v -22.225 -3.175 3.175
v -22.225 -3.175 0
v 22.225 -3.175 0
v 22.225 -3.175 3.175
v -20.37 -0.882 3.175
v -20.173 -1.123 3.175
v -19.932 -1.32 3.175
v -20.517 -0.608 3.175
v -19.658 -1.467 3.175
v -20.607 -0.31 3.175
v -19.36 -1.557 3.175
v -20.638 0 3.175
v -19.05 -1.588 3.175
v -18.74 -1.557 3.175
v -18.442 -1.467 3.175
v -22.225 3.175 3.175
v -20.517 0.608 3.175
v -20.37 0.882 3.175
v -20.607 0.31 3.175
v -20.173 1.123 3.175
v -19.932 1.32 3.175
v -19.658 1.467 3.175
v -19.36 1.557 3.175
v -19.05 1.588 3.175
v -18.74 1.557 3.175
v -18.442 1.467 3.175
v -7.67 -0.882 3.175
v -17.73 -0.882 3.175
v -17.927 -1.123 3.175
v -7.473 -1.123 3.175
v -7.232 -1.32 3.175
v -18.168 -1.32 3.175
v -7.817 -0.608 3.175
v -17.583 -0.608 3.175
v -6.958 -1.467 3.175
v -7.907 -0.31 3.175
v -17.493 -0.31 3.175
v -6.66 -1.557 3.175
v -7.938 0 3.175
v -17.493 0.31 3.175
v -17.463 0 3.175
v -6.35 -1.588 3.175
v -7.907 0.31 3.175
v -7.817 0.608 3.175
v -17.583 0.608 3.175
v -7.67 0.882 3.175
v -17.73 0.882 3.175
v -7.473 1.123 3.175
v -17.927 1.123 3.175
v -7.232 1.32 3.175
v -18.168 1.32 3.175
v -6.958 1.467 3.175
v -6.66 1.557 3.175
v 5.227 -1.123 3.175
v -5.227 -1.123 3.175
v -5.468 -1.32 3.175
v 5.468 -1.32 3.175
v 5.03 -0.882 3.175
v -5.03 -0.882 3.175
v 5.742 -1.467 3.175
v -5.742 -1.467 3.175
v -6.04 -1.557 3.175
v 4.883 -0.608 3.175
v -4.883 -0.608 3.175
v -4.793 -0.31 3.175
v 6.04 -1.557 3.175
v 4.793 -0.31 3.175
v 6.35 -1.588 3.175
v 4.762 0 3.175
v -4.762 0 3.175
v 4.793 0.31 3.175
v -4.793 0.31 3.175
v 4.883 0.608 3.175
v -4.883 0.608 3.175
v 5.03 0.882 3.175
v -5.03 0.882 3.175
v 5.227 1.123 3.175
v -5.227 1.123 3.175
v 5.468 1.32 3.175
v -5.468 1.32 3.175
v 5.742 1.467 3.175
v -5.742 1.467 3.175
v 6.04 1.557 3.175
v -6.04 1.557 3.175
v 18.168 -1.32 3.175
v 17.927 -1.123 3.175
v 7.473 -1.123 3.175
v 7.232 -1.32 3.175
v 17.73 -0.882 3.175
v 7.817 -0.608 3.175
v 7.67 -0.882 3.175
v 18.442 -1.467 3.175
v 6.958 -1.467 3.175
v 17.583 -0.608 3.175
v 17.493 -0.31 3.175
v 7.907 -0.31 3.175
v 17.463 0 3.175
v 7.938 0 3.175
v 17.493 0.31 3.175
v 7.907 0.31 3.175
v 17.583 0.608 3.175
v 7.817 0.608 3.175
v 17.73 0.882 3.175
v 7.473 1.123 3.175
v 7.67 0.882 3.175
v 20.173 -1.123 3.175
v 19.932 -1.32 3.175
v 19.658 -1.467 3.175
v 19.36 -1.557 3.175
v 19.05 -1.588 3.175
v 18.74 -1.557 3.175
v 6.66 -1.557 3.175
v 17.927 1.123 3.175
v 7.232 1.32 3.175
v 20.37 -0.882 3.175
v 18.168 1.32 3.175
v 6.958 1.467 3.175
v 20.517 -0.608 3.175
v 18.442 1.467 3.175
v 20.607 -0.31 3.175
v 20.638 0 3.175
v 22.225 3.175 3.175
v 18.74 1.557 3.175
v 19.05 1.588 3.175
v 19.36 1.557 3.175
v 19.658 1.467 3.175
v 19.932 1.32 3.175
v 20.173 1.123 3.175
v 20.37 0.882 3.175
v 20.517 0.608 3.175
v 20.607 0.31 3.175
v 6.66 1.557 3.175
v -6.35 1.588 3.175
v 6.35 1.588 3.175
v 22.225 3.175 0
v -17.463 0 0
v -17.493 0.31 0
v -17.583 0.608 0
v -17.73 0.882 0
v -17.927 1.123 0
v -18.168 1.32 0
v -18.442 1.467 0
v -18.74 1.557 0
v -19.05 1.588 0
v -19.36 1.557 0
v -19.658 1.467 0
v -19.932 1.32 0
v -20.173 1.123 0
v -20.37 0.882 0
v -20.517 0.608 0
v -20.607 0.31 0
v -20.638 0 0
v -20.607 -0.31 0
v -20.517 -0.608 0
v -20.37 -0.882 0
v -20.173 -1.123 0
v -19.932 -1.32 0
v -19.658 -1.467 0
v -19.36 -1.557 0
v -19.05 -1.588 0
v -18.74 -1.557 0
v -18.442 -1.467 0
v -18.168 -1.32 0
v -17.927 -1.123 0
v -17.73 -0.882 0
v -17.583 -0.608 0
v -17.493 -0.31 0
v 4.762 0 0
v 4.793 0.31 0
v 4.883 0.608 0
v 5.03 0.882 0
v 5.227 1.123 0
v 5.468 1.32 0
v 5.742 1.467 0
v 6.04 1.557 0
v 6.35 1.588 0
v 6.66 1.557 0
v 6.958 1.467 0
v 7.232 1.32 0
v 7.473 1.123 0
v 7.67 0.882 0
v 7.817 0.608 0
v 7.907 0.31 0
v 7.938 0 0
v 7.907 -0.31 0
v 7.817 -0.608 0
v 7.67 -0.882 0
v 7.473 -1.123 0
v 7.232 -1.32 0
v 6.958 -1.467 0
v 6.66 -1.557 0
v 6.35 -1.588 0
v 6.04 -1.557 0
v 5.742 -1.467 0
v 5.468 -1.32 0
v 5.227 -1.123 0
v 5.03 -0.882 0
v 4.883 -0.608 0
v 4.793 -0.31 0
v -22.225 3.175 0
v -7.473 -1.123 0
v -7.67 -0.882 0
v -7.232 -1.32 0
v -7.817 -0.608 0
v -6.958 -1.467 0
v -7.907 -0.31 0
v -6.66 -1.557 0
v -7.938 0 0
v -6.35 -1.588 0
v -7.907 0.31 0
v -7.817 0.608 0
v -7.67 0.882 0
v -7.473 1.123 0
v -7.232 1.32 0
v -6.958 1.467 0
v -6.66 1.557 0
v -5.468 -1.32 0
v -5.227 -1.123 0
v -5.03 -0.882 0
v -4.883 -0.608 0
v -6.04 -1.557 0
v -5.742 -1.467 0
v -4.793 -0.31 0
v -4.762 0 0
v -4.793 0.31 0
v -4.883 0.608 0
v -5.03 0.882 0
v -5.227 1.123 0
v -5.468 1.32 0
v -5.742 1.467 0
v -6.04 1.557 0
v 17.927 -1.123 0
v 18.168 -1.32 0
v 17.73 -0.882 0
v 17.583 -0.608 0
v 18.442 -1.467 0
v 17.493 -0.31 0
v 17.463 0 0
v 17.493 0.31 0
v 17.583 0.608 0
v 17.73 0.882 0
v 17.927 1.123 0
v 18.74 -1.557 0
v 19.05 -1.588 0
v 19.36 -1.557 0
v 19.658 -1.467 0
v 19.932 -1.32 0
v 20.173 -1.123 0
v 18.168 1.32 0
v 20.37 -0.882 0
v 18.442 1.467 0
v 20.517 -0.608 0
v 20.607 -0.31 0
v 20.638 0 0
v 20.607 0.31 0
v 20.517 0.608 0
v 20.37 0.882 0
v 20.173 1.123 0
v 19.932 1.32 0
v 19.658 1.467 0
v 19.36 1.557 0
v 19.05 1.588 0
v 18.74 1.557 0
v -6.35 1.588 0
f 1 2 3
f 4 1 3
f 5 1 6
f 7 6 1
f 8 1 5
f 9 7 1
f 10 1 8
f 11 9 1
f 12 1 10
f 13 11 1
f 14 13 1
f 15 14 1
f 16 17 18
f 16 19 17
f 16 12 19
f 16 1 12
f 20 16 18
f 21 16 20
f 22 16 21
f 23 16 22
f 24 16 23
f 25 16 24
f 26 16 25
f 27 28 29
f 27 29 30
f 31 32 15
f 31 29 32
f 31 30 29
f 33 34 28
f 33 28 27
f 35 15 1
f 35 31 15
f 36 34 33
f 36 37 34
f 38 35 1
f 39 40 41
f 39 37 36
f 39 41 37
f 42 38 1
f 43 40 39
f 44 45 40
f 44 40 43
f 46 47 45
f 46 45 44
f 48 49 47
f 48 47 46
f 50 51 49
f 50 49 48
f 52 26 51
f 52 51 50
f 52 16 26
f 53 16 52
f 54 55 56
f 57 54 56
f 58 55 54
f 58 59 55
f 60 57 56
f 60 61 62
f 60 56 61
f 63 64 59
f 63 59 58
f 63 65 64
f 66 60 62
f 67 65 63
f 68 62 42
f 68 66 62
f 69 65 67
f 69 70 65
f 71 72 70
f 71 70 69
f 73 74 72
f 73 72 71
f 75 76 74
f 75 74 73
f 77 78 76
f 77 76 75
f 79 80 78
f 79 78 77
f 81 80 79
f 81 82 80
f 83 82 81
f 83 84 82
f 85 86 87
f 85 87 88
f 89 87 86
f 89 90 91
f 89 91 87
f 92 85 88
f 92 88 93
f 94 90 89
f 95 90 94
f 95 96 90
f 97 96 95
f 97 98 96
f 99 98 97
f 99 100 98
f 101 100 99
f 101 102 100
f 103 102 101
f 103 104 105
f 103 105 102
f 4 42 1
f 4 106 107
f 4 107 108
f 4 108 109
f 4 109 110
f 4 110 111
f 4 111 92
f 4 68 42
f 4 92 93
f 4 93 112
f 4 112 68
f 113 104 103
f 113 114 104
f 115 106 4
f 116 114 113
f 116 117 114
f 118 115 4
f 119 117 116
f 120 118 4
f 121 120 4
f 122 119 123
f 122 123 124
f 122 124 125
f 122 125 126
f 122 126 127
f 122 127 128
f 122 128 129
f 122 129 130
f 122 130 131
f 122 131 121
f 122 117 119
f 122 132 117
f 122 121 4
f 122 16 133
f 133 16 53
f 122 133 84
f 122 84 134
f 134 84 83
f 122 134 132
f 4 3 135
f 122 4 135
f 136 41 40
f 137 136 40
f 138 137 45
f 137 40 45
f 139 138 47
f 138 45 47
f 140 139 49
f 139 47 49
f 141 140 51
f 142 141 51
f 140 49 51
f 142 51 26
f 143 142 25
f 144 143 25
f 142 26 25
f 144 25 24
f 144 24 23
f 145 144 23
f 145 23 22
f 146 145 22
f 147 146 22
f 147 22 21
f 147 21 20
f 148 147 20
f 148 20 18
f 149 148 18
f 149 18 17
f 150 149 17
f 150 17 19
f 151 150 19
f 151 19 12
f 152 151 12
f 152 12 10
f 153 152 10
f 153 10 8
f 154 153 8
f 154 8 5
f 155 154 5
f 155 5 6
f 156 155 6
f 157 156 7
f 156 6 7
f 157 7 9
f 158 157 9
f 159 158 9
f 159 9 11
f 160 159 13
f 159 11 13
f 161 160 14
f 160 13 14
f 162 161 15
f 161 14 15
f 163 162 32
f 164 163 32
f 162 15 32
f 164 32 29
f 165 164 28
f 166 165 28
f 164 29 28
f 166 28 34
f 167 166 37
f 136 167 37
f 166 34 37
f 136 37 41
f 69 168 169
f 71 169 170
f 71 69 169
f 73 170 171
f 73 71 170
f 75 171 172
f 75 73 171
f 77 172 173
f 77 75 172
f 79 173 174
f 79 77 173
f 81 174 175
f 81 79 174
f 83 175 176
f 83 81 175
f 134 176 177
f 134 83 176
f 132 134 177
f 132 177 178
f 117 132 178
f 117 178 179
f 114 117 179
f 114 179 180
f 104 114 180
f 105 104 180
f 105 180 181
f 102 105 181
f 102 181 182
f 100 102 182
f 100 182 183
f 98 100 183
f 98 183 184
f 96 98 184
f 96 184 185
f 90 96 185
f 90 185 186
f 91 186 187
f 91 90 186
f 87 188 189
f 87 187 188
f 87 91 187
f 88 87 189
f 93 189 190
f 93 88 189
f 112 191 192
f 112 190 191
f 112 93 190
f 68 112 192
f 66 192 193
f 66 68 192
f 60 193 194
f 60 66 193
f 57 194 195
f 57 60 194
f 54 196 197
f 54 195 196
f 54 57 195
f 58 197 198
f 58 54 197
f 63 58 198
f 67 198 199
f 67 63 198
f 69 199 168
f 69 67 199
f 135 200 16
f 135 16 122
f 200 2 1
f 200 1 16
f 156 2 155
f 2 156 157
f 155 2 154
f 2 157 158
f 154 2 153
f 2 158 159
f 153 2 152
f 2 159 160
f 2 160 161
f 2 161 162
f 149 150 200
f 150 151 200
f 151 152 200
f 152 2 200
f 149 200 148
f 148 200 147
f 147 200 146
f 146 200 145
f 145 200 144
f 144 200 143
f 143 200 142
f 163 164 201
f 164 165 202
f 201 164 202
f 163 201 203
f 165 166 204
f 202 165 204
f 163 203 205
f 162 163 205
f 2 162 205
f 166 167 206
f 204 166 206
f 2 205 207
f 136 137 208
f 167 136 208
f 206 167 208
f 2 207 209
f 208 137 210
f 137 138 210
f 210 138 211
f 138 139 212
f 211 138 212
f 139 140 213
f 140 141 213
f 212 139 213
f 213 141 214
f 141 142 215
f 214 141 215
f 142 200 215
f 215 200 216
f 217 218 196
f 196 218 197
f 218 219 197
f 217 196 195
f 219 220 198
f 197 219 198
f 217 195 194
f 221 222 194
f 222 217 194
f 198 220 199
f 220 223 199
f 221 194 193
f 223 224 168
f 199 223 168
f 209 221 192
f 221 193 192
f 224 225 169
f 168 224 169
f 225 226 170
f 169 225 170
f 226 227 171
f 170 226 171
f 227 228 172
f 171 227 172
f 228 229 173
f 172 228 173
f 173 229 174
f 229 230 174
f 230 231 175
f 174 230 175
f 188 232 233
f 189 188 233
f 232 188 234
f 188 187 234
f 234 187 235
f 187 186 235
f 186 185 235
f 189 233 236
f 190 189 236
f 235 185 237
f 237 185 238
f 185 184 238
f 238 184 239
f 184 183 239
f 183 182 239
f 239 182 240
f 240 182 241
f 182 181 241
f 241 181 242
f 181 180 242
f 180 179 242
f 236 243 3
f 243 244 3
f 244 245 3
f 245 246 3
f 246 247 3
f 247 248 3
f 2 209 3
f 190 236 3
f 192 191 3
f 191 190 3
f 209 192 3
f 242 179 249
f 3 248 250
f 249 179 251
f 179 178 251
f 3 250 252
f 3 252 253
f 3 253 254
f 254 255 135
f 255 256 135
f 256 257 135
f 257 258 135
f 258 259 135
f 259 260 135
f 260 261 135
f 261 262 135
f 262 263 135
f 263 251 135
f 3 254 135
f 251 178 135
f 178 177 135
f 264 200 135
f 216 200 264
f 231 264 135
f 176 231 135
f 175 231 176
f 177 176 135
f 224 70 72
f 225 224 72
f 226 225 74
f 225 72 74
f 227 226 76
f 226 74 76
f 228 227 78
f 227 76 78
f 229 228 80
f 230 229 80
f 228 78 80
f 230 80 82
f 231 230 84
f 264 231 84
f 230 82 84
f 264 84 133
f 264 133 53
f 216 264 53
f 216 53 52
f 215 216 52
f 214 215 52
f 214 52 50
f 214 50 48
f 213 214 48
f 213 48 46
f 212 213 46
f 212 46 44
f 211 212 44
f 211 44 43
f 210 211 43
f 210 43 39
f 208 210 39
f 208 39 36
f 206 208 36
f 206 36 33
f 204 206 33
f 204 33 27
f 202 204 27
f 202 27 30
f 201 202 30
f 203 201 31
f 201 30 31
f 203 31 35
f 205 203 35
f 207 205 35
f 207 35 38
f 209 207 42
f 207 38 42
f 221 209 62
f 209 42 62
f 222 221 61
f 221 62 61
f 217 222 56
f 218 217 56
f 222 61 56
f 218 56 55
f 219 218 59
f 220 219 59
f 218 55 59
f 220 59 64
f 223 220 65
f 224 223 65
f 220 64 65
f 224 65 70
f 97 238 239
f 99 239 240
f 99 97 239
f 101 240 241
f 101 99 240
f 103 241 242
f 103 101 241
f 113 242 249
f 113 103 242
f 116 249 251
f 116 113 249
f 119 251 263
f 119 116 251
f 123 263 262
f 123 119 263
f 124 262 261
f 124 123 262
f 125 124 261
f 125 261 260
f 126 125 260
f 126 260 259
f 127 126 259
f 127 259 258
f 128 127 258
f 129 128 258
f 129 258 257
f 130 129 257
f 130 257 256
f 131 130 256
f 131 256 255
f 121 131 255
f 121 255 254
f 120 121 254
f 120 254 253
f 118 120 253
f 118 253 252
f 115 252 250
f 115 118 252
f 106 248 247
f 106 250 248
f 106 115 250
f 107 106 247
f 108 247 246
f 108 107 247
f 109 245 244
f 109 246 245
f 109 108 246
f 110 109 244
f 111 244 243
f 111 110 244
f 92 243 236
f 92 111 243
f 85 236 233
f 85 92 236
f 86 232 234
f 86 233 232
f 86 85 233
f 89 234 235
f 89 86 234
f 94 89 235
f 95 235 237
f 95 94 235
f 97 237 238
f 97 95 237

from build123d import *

# Parameters (mm, degrees)
SKETCH2_W           = 44.45
SKETCH2_H           = 6.35
BOSS_EXTRUDE1_DEPTH = 3.175
SKETCH3_R           = 1.5875
CUT_EXTRUDE1_DEPTH  = 4.175


with BuildPart() as part:
    # Sketch2 → Boss-Extrude1 (new body)
    with BuildSketch(Plane.XY):
        Rectangle(SKETCH2_W, SKETCH2_H)
    extrude(amount=BOSS_EXTRUDE1_DEPTH)

    # Sketch3 → Cut-Extrude1 (cut, through all)
    with BuildSketch(Plane.XY.offset(3.175)):
        with Locations((-6.35, 0)):
            Circle(SKETCH3_R)
        with Locations((-19.05, 0)):
            Circle(SKETCH3_R)
    cut_extrude1 = extrude(amount=-CUT_EXTRUDE1_DEPTH, mode=Mode.SUBTRACT)

    # Mirror1: Cut-Extrude1 across plane
    add(cut_extrude1.mirror(Plane(origin=(0, 0, 0), x_dir=(0, 0, 1), z_dir=(1, 0, 0))), mode=Mode.SUBTRACT)


solid = part.part
